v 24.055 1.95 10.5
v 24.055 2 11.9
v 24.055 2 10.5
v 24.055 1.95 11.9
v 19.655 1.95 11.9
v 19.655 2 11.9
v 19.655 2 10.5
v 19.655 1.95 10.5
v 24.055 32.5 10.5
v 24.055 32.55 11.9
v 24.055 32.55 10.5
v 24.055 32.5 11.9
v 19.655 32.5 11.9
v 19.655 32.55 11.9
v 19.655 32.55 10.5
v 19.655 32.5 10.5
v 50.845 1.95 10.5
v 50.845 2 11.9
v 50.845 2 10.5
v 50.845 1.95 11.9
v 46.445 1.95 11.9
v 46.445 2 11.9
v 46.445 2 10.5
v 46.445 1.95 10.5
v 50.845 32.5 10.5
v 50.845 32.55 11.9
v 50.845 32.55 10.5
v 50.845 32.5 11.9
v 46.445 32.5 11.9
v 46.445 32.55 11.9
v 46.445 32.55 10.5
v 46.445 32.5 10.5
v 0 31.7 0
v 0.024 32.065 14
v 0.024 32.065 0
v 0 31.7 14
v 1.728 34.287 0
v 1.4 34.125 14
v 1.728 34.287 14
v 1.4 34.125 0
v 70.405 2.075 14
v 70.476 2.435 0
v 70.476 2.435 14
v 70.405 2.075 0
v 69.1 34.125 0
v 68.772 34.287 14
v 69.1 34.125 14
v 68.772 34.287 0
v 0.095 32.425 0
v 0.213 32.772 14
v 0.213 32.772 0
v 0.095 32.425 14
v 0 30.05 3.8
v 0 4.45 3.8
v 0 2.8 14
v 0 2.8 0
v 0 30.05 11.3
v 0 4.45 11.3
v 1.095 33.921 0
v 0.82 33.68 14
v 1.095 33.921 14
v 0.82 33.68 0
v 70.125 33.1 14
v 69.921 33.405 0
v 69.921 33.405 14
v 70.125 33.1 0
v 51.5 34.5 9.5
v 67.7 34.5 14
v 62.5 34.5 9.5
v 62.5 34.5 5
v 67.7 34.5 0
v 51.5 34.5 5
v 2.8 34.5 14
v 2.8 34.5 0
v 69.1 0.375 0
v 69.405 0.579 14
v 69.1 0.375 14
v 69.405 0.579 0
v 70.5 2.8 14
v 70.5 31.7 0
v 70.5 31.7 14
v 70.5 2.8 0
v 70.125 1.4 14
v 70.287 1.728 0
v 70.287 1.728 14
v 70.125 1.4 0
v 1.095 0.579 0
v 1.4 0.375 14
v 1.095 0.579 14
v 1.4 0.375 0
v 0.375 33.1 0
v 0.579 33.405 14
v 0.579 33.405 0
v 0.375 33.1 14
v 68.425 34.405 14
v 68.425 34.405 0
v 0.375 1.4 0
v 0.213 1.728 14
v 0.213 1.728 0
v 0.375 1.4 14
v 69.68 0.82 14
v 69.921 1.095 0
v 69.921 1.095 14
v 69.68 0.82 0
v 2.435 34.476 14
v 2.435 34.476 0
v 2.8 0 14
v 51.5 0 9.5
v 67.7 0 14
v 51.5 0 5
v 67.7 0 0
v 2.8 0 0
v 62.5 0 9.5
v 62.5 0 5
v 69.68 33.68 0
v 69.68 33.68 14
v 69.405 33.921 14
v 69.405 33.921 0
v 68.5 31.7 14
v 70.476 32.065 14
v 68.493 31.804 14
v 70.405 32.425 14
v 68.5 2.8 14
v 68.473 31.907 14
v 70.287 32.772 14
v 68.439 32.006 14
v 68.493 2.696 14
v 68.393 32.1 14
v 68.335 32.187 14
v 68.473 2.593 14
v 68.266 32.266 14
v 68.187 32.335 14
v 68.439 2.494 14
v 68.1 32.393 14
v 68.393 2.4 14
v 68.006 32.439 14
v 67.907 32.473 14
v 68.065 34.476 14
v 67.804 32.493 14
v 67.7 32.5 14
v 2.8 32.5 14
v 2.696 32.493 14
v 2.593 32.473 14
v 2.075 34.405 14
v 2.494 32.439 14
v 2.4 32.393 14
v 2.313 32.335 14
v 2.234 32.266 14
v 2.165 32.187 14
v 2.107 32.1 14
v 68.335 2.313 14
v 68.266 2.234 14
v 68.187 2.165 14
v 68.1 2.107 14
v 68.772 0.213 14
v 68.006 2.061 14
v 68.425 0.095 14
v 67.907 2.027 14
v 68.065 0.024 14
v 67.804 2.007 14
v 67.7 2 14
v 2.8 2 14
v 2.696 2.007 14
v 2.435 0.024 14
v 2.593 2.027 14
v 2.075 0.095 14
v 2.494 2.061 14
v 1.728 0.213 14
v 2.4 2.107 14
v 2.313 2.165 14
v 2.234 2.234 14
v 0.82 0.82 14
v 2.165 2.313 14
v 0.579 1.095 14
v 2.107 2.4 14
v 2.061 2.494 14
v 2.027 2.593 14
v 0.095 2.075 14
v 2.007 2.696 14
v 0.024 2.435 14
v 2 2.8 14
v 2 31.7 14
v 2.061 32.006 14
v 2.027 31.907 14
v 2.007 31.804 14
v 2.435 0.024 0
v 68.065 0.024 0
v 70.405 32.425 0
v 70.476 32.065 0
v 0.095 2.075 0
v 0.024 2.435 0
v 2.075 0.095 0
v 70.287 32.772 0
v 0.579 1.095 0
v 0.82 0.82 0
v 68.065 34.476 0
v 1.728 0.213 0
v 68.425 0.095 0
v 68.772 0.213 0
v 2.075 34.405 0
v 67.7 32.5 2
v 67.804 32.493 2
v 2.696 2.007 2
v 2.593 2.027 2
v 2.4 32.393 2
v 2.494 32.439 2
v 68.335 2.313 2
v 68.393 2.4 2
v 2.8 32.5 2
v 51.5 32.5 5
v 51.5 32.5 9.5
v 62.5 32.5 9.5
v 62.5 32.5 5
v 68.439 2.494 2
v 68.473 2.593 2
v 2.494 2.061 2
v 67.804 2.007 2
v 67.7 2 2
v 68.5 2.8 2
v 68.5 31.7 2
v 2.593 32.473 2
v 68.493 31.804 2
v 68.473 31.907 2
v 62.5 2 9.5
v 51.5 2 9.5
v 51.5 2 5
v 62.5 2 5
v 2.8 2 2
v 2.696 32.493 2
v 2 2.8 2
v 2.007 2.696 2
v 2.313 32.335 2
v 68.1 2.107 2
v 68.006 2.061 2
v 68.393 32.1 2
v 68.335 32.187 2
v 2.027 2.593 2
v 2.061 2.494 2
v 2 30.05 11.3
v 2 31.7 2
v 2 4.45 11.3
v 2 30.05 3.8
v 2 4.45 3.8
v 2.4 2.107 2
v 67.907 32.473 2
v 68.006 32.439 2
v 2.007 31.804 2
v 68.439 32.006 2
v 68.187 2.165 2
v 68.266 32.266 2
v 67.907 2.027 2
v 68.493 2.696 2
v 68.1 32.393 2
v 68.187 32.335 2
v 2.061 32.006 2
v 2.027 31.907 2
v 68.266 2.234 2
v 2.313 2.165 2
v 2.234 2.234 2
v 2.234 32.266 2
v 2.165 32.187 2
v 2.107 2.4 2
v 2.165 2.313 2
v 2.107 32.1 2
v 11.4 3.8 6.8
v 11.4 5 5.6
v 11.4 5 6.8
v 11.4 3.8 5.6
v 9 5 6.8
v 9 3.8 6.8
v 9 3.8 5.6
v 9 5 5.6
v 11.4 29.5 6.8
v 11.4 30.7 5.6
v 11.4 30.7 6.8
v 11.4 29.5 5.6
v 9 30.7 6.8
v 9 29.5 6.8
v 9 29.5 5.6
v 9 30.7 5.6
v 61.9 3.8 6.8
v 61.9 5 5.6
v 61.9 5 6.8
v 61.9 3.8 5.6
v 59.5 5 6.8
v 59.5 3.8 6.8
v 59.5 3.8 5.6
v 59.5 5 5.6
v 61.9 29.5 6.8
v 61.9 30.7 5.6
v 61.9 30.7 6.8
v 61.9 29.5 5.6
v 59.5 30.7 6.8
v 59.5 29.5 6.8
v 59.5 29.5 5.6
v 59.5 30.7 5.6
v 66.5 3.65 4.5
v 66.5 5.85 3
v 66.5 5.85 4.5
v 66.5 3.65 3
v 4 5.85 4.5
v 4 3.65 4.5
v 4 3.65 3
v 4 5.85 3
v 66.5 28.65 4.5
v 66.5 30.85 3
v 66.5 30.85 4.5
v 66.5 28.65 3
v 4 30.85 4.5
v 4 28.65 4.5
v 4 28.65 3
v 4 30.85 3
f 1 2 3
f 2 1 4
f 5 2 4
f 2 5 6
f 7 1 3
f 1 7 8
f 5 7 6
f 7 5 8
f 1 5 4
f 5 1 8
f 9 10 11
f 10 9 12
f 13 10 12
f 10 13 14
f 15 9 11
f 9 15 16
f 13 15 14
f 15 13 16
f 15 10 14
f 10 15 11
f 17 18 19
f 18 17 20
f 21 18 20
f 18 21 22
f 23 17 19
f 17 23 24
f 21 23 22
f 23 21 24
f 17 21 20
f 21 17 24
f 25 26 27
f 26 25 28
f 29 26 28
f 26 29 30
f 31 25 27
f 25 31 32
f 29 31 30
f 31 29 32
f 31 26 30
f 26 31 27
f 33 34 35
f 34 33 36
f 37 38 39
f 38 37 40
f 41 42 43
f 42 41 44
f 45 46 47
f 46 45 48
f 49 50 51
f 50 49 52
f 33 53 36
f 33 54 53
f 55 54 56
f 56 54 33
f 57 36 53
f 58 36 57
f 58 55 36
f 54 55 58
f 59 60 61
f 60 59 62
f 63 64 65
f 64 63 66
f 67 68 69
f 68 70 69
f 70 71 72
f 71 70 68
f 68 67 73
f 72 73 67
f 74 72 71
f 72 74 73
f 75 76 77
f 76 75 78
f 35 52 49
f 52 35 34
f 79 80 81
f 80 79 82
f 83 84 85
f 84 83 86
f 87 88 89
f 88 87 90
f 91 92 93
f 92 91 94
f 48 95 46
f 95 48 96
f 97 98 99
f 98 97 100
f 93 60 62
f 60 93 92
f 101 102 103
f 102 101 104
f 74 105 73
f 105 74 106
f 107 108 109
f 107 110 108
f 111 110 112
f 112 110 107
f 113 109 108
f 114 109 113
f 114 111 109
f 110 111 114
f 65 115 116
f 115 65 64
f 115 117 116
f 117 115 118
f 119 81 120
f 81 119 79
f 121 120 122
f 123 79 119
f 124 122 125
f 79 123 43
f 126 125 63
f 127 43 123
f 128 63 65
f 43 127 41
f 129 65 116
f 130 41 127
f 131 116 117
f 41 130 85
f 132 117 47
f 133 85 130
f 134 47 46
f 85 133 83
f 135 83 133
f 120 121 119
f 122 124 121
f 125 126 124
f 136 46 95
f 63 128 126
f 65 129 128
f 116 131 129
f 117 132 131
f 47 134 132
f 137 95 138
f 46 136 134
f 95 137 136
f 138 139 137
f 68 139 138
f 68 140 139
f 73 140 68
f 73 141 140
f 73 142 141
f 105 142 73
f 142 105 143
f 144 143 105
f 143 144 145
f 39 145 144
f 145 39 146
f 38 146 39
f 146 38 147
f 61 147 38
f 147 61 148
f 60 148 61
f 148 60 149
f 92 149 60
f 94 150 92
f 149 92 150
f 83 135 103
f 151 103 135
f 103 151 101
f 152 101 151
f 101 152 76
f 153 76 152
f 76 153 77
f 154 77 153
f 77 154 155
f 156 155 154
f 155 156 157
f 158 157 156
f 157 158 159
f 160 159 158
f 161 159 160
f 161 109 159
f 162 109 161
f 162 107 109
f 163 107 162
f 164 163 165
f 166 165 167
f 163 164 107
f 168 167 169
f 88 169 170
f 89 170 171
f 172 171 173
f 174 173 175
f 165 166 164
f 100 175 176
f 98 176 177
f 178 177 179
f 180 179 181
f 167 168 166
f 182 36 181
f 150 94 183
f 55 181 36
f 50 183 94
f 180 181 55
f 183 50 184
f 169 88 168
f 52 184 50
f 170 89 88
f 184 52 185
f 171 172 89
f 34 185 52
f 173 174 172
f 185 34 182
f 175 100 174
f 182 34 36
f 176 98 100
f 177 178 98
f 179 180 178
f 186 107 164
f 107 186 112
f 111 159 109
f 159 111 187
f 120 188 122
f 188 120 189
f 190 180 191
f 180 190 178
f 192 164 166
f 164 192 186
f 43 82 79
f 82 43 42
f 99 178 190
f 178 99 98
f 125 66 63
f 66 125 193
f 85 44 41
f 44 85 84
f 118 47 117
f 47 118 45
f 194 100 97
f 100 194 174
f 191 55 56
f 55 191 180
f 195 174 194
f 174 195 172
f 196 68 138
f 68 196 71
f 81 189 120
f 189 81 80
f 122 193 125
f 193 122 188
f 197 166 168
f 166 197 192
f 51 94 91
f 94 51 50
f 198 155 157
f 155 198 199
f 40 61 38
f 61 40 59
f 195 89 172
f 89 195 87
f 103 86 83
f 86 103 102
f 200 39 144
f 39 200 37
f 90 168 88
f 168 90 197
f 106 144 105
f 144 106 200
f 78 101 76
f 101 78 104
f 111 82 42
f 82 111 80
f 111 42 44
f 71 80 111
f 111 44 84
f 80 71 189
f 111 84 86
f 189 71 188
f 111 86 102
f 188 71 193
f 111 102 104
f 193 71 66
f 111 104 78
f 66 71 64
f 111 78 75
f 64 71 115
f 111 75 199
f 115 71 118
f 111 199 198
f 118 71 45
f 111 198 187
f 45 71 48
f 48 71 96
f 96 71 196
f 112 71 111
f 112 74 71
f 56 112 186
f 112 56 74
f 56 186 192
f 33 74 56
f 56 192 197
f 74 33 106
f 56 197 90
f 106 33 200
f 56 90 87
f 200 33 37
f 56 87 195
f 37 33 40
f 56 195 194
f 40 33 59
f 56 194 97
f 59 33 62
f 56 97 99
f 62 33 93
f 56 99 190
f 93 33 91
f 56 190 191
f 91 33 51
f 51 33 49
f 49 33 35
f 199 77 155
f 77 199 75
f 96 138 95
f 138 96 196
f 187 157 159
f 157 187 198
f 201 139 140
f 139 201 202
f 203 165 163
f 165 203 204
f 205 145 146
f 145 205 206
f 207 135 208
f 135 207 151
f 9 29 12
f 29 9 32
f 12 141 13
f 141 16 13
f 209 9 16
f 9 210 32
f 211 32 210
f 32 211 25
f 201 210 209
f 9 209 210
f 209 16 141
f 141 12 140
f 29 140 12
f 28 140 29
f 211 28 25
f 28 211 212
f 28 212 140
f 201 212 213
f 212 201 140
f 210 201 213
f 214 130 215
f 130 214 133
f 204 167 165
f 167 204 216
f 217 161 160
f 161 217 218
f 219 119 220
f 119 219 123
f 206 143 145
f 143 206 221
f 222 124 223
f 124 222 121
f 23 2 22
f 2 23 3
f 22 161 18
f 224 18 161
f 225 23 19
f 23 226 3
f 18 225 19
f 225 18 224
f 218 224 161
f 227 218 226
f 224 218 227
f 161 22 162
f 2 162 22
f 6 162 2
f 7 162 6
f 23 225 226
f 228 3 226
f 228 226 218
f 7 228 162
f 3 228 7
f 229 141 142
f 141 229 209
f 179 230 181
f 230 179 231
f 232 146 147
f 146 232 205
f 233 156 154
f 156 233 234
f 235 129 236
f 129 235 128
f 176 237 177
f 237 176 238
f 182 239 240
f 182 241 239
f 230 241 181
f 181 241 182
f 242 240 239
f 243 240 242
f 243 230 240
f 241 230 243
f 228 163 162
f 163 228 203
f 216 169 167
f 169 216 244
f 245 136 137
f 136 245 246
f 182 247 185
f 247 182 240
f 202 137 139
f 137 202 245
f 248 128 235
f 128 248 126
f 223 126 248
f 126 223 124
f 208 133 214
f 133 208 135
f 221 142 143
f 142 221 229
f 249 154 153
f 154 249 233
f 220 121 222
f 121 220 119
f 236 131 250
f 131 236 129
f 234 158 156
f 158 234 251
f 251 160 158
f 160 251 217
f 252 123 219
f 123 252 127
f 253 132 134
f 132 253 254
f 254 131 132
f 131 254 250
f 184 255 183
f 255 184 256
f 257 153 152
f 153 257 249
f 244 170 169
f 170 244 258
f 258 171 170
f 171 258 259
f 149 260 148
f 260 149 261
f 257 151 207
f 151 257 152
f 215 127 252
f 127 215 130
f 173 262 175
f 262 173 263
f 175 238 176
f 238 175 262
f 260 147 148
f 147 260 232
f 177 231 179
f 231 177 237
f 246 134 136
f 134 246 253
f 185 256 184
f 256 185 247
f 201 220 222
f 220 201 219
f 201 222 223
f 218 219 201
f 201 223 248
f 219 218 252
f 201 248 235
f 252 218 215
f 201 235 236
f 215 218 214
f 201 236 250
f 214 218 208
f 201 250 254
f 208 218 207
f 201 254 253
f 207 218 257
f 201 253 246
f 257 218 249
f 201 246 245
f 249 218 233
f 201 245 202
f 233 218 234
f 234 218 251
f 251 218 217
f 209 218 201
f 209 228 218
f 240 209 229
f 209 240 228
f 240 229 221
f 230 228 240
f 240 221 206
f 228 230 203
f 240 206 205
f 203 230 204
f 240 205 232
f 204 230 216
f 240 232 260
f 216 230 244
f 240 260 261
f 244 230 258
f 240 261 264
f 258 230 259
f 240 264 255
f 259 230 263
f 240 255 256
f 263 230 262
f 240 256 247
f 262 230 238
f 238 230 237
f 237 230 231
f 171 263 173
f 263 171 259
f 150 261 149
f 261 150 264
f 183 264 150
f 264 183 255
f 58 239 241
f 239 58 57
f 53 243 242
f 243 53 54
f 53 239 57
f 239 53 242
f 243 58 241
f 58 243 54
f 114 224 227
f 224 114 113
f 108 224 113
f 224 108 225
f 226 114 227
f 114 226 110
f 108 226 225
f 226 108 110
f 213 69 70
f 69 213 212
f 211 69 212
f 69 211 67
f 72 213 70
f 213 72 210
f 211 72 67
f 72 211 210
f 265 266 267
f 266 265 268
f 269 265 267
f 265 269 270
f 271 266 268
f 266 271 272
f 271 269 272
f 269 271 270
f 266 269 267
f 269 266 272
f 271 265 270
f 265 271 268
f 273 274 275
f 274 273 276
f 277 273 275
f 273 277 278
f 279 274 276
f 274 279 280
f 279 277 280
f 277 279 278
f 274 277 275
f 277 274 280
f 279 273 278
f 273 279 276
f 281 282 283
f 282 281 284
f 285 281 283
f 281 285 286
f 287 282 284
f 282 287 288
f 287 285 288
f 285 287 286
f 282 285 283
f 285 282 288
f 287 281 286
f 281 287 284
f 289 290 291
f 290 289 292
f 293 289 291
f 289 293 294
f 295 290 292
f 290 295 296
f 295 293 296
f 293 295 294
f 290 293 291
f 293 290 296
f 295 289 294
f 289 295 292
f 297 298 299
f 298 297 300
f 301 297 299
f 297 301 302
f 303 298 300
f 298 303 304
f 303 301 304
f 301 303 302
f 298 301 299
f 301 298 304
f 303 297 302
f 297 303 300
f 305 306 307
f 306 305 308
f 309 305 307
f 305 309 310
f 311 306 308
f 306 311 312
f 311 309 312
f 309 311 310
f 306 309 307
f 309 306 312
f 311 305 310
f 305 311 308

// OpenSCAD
// CynusLink ESP32-S3 gateway enclosure V3
// ESP32-S3 DevKitC-1 style board
// Screwless two-piece snap fit, enlarged internal clearance.
// Units: mm

$fn = 48;
part = "base"; // "base", "lid", or "preview"

// PCB reference dimensions
pcb_l = 62.8;
pcb_w = 25.4;
pcb_t = 1.6;

// V3: deliberately more room than the earlier enclosure.
// Internal cavity is 66.5 x 30.5 mm.
inner_l = 66.5;
inner_w = 30.5;
wall = 2.0;
floor_t = 2.0;
base_h = 14.0;
corner_r = 2.8;

outer_l = inner_l + 2*wall;
outer_w = inner_w + 2*wall;

lid_t = 2.2;
lid_skirt_h = 4.0;
lid_clear = 0.30;

module rounded_box(l,w,h,r){
    hull(){
        for(x=[r,l-r], y=[r,w-r])
            translate([x,y,0]) cylinder(r=r,h=h);
    }
}

module base_shell(){
    difference(){
        rounded_box(outer_l, outer_w, base_h, corner_r);

        // Open cavity.
        translate([wall,wall,floor_t])
            rounded_box(inner_l, inner_w, base_h, max(corner_r-wall,0.7));

        // Wide end opening for the DevKitC-1 USB connector area.
        // Extra width/height gives clone boards some tolerance.
        translate([-0.2, outer_w/2-12.8, 3.8])
            cube([wall+0.7,25.6,7.5]);

        // BOOT / RESET access slots.
        translate([outer_l-19.0,-0.2,5.0]) cube([11.0,wall+0.5,4.5]);
        translate([outer_l-19.0,outer_w-wall-0.3,5.0]) cube([11.0,wall+0.5,4.5]);

        // Four snap pockets, INSIDE the long walls.
        for(x=[outer_l*0.31, outer_l*0.69]){
            translate([x-2.2, wall-0.05, base_h-3.5])
                cube([4.4,1.25,1.40]);
            translate([x-2.2, outer_w-wall-1.20, base_h-3.5])
                cube([4.4,1.25,1.40]);
        }
    }

    // PCB edge rails. Their position is based on the PCB width rather than
    // the enlarged cavity width, so the wider enclosure cannot let the board fall through.
    rail_z = 3.0;
    rail_h = 1.5;
    rail_w = 2.2;
    overlap = 0.9;
    y_low = outer_w/2 - pcb_w/2 - overlap;
    y_high = outer_w/2 + pcb_w/2 - rail_w + overlap;

    translate([wall+2.0, y_low, rail_z])
        cube([inner_l-4.0, rail_w, rail_h]);
    translate([wall+2.0, y_high, rail_z])
        cube([inner_l-4.0, rail_w, rail_h]);

    // Small retainers above the PCB edge to reduce rattling.
    ret_z = rail_z + pcb_t + 1.0;
    for(x=[wall+7.0, outer_l-wall-9.0]){
        translate([x, y_low+0.15, ret_z]) cube([2.4,1.2,1.2]);
        translate([x, y_high+rail_w-1.35, ret_z]) cube([2.4,1.2,1.2]);
    }
}

module lid(){
    difference(){
        union(){
            // Top plate.
            rounded_box(outer_l, outer_w, lid_t, corner_r);

            // Internal locating skirt / lip. Interior is +Z.
            translate([wall-lid_clear, wall-lid_clear, lid_t])
            difference(){
                rounded_box(
                    inner_l+2*lid_clear,
                    inner_w+2*lid_clear,
                    lid_skirt_h,
                    max(corner_r-wall+0.35,0.9)
                );
                translate([1.30,1.30,-0.1])
                    rounded_box(
                        inner_l+2*lid_clear-2.60,
                        inner_w+2*lid_clear-2.60,
                        lid_skirt_h+0.2,
                        0.7
                    );
            }

            // Snap bumps that mate with the internal pockets in the base.
            for(x=[outer_l*0.31, outer_l*0.69]){
                translate([x-1.6, wall-lid_clear-0.42, lid_t+1.15])
                    cube([3.2,0.9,0.85]);
                translate([x-1.6, outer_w-wall+lid_clear-0.48, lid_t+1.15])
                    cube([3.2,0.9,0.85]);
            }
        }

        // Ventilation slots.
        for(i=[0:5])
            translate([outer_l-30+i*3.4, outer_w/2-7.0, -0.2])
                rounded_box(1.55,14.0,lid_t+0.4,0.6);

        // V3: engraved label on the OUTSIDE of the lid.
        // Exterior is the -Z face. Mirroring in X makes it readable when
        // looking at the exterior surface.
        translate([outer_l/2, outer_w/2, -0.05])
            linear_extrude(height=0.70)
                mirror([1,0,0])
                    text(
                        "CYNUS LINK",
                        size=5.4,
                        font="DejaVu Sans:style=Bold",
                        halign="center",
                        valign="center"
                    );
    }
}

if(part=="base") base_shell();
else if(part=="lid") lid();
else {
    color("gray") base_shell();
    translate([0,0,base_h+0.6]) color("lightgray") lid();
}
